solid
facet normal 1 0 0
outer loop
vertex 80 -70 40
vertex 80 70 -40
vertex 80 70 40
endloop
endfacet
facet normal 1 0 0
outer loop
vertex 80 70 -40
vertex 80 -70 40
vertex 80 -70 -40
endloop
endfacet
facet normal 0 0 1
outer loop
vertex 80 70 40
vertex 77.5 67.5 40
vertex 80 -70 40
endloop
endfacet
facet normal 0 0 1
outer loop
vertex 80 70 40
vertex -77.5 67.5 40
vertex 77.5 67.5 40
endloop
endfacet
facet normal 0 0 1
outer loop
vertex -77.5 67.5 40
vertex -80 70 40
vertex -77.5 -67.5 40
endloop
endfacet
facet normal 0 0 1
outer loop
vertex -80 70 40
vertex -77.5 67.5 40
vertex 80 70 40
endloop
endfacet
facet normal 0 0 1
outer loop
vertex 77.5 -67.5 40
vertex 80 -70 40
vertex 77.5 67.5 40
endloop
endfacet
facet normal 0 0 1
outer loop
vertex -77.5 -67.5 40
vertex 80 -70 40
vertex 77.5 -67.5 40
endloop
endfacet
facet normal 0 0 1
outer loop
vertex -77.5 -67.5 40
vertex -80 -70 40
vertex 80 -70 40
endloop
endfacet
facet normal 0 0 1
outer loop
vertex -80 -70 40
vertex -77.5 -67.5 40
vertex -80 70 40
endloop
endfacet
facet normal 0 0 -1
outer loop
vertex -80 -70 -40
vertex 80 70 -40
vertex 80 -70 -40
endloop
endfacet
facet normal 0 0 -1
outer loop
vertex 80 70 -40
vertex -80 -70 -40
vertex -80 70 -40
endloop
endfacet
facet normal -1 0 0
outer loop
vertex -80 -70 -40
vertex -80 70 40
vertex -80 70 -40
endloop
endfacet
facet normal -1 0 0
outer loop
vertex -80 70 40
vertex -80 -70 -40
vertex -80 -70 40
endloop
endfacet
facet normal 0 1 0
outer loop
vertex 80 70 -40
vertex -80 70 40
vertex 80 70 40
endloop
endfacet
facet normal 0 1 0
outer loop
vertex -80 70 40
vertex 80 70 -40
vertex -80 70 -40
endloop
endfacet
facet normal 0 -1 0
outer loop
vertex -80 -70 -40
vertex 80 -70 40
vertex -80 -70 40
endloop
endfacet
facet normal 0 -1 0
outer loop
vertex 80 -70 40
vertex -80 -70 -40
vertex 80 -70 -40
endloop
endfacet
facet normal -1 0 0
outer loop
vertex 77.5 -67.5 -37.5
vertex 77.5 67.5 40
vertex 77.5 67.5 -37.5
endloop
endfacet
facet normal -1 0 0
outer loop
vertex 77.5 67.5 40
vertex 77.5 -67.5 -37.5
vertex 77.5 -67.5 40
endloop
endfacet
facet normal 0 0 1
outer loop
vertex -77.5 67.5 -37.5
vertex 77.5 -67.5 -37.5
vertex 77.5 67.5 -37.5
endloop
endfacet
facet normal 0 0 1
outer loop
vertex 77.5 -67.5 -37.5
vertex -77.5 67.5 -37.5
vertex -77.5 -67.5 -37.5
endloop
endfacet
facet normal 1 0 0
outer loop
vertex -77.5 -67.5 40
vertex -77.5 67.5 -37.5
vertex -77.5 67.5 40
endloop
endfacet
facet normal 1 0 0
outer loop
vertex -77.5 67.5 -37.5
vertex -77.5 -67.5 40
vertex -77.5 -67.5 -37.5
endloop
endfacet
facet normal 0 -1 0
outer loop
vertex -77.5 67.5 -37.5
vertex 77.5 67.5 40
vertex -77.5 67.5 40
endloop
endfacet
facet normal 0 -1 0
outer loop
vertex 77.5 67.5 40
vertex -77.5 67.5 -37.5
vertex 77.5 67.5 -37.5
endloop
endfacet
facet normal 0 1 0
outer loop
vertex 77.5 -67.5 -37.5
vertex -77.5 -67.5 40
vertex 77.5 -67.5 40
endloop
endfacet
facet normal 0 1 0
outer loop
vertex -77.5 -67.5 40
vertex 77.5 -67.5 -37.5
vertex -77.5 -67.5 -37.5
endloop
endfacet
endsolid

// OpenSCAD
// ========================================
// a 16 x 14 x 8 cm enclosure with 0.25 cm wall thickness
// NeuroCAD canonical IR; dimensions are millimetres
// ========================================
$fn = 48;

difference() {
  cube(size=[160, 140, 80], center=true);
  translate([0, 0, 1.35]) {
    cube(size=[155, 135, 77.7], center=true);
  }
}
